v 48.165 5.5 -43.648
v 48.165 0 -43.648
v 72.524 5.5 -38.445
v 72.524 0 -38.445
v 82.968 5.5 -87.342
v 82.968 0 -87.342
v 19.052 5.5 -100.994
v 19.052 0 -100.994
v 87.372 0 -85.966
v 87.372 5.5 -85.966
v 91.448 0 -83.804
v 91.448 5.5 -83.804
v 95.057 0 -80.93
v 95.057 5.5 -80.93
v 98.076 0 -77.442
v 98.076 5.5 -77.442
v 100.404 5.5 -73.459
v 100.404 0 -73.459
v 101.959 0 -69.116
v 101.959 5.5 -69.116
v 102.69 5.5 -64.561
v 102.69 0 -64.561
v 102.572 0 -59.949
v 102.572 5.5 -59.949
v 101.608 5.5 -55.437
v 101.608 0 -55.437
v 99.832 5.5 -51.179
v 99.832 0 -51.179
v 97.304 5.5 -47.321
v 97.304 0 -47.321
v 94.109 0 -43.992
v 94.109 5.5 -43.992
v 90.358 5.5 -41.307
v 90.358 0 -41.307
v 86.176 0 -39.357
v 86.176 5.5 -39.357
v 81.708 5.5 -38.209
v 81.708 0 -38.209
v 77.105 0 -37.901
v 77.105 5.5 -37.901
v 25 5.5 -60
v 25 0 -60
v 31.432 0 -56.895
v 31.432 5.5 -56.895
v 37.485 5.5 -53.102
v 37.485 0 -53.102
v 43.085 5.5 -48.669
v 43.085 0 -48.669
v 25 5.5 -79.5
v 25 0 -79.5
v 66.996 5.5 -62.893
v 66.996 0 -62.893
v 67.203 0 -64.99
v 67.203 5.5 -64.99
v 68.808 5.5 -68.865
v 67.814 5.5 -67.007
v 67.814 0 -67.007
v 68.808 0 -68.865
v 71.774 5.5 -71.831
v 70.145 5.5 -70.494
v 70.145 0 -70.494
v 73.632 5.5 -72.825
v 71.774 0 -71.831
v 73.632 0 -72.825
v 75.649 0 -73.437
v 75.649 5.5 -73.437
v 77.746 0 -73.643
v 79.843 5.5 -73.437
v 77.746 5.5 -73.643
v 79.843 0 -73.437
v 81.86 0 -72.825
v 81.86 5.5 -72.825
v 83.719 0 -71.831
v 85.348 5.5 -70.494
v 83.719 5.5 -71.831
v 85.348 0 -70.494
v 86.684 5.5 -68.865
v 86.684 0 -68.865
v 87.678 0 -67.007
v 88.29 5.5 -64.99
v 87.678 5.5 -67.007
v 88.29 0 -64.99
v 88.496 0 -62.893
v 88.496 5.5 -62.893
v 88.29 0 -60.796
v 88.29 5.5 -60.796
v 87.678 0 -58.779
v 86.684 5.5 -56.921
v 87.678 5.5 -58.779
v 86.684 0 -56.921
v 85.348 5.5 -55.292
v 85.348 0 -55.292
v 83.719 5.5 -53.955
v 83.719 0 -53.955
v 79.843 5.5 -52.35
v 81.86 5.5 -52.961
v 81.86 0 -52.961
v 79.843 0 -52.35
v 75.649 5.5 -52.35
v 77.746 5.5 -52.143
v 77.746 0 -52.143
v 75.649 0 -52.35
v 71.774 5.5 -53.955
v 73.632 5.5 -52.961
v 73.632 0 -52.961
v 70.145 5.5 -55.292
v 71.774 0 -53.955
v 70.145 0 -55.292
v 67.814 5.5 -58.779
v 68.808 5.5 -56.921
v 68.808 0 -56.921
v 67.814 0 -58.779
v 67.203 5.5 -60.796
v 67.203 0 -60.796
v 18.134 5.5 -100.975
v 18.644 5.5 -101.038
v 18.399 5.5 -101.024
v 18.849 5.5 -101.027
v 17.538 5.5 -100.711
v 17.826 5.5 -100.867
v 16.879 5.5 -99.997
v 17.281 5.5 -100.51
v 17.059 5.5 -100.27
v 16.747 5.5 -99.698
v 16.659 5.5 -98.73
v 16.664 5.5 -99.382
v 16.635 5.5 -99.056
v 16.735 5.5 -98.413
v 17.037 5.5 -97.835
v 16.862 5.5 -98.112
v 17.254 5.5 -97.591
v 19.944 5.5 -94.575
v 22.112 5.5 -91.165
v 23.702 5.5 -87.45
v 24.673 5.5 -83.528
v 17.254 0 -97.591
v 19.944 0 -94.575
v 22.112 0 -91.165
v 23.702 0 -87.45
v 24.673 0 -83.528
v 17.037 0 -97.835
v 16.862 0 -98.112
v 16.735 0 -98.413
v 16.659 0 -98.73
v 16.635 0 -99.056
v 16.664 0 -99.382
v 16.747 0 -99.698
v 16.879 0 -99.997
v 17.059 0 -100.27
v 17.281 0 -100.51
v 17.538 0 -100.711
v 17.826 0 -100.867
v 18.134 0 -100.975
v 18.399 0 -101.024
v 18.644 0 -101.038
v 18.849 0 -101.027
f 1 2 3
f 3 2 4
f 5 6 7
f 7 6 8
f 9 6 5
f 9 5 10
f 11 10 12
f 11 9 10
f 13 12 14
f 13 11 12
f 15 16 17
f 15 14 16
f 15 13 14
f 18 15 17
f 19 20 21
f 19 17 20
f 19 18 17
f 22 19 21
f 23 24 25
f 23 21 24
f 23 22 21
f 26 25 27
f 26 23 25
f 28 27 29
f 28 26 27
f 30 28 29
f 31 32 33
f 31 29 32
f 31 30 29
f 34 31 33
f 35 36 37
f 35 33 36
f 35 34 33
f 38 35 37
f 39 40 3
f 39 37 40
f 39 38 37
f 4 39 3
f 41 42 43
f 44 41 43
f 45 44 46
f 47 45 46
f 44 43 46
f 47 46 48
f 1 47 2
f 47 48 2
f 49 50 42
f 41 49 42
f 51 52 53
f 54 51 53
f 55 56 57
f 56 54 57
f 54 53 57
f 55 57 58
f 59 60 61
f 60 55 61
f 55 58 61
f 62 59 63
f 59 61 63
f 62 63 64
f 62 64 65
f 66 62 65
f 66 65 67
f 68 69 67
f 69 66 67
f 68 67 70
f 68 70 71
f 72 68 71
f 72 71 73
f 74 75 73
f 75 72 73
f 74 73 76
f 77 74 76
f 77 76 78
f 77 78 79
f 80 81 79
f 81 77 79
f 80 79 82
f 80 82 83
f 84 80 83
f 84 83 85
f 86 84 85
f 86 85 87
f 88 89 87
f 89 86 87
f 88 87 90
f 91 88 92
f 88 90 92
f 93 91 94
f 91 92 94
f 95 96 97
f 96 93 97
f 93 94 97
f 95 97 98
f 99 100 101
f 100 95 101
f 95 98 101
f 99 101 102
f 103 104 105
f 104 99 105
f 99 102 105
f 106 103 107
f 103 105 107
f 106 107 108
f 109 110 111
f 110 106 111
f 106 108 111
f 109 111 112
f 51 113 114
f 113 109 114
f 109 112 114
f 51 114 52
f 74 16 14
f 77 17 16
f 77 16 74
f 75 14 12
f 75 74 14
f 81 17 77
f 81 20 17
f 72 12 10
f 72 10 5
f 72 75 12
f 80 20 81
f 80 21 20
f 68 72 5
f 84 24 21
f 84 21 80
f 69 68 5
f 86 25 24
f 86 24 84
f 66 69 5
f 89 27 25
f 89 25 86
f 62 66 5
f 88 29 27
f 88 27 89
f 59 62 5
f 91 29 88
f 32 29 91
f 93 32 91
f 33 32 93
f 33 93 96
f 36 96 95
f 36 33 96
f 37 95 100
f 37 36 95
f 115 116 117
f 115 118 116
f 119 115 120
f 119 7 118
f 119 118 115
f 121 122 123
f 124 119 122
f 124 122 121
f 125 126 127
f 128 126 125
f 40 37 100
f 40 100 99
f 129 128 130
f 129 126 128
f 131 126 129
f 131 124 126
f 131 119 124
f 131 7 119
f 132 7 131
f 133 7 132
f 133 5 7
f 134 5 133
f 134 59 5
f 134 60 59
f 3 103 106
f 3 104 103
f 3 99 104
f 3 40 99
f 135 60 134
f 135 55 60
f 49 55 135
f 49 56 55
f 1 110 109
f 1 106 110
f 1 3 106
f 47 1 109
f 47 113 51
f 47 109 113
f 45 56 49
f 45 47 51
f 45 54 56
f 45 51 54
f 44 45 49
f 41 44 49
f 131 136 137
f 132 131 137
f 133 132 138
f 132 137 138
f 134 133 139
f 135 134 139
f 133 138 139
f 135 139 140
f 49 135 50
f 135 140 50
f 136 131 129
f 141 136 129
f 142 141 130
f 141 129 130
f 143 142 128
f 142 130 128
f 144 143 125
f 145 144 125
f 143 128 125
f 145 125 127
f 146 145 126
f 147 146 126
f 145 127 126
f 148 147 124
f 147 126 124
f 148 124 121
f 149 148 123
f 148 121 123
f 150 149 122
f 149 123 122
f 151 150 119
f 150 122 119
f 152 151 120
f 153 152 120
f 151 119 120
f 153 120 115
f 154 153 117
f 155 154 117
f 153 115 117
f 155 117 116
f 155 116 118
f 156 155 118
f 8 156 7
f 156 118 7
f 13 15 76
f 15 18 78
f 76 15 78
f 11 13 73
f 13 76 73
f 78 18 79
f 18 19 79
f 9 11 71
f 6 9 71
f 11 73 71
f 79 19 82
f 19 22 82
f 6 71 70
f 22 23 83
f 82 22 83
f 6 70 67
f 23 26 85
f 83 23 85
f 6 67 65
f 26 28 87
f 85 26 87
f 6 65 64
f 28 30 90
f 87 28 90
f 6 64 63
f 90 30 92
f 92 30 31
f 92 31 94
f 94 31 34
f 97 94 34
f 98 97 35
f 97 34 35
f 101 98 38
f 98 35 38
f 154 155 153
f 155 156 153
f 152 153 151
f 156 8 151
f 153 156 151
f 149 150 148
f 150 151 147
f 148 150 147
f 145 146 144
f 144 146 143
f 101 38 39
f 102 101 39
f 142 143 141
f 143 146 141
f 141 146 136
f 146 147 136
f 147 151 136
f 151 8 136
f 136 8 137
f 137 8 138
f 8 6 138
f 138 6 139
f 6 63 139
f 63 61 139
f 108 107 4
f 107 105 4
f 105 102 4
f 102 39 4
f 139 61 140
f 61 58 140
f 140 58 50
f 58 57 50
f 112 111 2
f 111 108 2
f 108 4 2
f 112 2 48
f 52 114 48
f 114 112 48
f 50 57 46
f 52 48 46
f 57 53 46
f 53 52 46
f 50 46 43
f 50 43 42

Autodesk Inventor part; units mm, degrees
ref_plane "YZ Plane" through (0, 0, 0) normal (1, 0, 0) x (0, 1, 0)
ref_plane "XZ Plane" through (0, 0, 0) normal (0, 1, 0) x (-1, 0, 0)
ref_plane "XY Plane" through (0, 0, 0) normal (0, 0, 1) x (1, 0, 0)
sketch "スケッチ1" plane through (0, 0, 0) normal (0, 1, 0) x (-1, 0, 0)
  line L0 (25, 0) -> (-25, 0)
  line L1 (-25, 0) -> (-25, -104.5)
  line L2 (-25, -104.5) -> (25, -104.5)
  line L3 (25, -104.5) -> (25, 0)
  circle A0 centre (0, 0) radius 25
  circle A1 centre (0, 0) radius 57 construction
  circle A2 centre (0, 0) radius 75 construction
  circle A3 centre (0, 0) radius 10.75
  circle A4 centre (-77.746127, -62.893082) radius 25
  circle A5 centre (-77.746127, -62.893082) radius 10.75
  line L4 (-77.746127, -62.893082) -> (-82.968428, -87.341549)
  line L5 (-82.968428, -87.341549) -> (-5.222301, -103.948468)
  line L6 (5.222301, -55.051532) -> (-72.523826, -38.444614)
  circle A6 centre (0, -79.5) radius 25
  circle A7 centre (0, 0) radius 82
  circle A8 centre (0, 0) radius 65
  line L7 (-48.165066, -43.647753) -> (-96.972293, -33.222313)
  line L8 (-96.972293, -33.222313) -> (-92.794452, -13.663539)
  line L9 (-92.794452, -13.663539) -> (-43.987225, -24.088979)
  line L10 (-43.987225, -24.088979) -> (-48.165066, -43.647753)
  line L11 (-96.972293, -33.222313) -> (-102.194595, -57.67078)
  point P0 (-25, -79.5)
  point P1 (-25, -48.595915)
  point P2 (-25, -60)
  point P3 (-48.165066, -43.647753)
  point P4 (-61.75052, -20.294661)
  dimension "d22" = 130
  dimension "d0" = 114
  dimension "d2" = 150
  dimension "d4" = 21.5
  dimension "d5" = 50
  dimension "d19" = 79.5
  dimension "d20" = 79.5
  dimension "d21" = 164
  dimension "d23" = 20
sketch "スケッチ1 outline for 押し出し1" plane through (0, 0, 0) normal (0, 1, 0) x (-1, 0, 0)
  arc A0 (-72.523826, -38.444614) -> (-82.968428, -87.341549) centre (-77.746127, -62.893082) ccw
  line L0 (-82.968428, -87.341549) -> (-5.222301, -103.948468)
  arc A1 (-5.222301, -103.948468) -> (-25, -79.5) centre (0, -79.5) cw
  line L1 (-25, -79.5) -> (-25, -60)
  arc A2 (-25, -60) -> (-48.165066, -43.647753) centre (0, 0) cw
  line L2 (-48.165066, -43.647753) -> (-72.523826, -38.444614)
  circle A3 centre (-77.746127, -62.893082) radius 10.75
extrude "押し出し1" add sketch "スケッチ1 outline for 押し出し1" along normal blind 5.5
fillet "フィレット1" radius 2 1 edges at (5.2223, 2.75, -103.9485)
equation "\"d20\" = d19"
properties part number "gear_plate_3" material "木材 (カエデ材)"
